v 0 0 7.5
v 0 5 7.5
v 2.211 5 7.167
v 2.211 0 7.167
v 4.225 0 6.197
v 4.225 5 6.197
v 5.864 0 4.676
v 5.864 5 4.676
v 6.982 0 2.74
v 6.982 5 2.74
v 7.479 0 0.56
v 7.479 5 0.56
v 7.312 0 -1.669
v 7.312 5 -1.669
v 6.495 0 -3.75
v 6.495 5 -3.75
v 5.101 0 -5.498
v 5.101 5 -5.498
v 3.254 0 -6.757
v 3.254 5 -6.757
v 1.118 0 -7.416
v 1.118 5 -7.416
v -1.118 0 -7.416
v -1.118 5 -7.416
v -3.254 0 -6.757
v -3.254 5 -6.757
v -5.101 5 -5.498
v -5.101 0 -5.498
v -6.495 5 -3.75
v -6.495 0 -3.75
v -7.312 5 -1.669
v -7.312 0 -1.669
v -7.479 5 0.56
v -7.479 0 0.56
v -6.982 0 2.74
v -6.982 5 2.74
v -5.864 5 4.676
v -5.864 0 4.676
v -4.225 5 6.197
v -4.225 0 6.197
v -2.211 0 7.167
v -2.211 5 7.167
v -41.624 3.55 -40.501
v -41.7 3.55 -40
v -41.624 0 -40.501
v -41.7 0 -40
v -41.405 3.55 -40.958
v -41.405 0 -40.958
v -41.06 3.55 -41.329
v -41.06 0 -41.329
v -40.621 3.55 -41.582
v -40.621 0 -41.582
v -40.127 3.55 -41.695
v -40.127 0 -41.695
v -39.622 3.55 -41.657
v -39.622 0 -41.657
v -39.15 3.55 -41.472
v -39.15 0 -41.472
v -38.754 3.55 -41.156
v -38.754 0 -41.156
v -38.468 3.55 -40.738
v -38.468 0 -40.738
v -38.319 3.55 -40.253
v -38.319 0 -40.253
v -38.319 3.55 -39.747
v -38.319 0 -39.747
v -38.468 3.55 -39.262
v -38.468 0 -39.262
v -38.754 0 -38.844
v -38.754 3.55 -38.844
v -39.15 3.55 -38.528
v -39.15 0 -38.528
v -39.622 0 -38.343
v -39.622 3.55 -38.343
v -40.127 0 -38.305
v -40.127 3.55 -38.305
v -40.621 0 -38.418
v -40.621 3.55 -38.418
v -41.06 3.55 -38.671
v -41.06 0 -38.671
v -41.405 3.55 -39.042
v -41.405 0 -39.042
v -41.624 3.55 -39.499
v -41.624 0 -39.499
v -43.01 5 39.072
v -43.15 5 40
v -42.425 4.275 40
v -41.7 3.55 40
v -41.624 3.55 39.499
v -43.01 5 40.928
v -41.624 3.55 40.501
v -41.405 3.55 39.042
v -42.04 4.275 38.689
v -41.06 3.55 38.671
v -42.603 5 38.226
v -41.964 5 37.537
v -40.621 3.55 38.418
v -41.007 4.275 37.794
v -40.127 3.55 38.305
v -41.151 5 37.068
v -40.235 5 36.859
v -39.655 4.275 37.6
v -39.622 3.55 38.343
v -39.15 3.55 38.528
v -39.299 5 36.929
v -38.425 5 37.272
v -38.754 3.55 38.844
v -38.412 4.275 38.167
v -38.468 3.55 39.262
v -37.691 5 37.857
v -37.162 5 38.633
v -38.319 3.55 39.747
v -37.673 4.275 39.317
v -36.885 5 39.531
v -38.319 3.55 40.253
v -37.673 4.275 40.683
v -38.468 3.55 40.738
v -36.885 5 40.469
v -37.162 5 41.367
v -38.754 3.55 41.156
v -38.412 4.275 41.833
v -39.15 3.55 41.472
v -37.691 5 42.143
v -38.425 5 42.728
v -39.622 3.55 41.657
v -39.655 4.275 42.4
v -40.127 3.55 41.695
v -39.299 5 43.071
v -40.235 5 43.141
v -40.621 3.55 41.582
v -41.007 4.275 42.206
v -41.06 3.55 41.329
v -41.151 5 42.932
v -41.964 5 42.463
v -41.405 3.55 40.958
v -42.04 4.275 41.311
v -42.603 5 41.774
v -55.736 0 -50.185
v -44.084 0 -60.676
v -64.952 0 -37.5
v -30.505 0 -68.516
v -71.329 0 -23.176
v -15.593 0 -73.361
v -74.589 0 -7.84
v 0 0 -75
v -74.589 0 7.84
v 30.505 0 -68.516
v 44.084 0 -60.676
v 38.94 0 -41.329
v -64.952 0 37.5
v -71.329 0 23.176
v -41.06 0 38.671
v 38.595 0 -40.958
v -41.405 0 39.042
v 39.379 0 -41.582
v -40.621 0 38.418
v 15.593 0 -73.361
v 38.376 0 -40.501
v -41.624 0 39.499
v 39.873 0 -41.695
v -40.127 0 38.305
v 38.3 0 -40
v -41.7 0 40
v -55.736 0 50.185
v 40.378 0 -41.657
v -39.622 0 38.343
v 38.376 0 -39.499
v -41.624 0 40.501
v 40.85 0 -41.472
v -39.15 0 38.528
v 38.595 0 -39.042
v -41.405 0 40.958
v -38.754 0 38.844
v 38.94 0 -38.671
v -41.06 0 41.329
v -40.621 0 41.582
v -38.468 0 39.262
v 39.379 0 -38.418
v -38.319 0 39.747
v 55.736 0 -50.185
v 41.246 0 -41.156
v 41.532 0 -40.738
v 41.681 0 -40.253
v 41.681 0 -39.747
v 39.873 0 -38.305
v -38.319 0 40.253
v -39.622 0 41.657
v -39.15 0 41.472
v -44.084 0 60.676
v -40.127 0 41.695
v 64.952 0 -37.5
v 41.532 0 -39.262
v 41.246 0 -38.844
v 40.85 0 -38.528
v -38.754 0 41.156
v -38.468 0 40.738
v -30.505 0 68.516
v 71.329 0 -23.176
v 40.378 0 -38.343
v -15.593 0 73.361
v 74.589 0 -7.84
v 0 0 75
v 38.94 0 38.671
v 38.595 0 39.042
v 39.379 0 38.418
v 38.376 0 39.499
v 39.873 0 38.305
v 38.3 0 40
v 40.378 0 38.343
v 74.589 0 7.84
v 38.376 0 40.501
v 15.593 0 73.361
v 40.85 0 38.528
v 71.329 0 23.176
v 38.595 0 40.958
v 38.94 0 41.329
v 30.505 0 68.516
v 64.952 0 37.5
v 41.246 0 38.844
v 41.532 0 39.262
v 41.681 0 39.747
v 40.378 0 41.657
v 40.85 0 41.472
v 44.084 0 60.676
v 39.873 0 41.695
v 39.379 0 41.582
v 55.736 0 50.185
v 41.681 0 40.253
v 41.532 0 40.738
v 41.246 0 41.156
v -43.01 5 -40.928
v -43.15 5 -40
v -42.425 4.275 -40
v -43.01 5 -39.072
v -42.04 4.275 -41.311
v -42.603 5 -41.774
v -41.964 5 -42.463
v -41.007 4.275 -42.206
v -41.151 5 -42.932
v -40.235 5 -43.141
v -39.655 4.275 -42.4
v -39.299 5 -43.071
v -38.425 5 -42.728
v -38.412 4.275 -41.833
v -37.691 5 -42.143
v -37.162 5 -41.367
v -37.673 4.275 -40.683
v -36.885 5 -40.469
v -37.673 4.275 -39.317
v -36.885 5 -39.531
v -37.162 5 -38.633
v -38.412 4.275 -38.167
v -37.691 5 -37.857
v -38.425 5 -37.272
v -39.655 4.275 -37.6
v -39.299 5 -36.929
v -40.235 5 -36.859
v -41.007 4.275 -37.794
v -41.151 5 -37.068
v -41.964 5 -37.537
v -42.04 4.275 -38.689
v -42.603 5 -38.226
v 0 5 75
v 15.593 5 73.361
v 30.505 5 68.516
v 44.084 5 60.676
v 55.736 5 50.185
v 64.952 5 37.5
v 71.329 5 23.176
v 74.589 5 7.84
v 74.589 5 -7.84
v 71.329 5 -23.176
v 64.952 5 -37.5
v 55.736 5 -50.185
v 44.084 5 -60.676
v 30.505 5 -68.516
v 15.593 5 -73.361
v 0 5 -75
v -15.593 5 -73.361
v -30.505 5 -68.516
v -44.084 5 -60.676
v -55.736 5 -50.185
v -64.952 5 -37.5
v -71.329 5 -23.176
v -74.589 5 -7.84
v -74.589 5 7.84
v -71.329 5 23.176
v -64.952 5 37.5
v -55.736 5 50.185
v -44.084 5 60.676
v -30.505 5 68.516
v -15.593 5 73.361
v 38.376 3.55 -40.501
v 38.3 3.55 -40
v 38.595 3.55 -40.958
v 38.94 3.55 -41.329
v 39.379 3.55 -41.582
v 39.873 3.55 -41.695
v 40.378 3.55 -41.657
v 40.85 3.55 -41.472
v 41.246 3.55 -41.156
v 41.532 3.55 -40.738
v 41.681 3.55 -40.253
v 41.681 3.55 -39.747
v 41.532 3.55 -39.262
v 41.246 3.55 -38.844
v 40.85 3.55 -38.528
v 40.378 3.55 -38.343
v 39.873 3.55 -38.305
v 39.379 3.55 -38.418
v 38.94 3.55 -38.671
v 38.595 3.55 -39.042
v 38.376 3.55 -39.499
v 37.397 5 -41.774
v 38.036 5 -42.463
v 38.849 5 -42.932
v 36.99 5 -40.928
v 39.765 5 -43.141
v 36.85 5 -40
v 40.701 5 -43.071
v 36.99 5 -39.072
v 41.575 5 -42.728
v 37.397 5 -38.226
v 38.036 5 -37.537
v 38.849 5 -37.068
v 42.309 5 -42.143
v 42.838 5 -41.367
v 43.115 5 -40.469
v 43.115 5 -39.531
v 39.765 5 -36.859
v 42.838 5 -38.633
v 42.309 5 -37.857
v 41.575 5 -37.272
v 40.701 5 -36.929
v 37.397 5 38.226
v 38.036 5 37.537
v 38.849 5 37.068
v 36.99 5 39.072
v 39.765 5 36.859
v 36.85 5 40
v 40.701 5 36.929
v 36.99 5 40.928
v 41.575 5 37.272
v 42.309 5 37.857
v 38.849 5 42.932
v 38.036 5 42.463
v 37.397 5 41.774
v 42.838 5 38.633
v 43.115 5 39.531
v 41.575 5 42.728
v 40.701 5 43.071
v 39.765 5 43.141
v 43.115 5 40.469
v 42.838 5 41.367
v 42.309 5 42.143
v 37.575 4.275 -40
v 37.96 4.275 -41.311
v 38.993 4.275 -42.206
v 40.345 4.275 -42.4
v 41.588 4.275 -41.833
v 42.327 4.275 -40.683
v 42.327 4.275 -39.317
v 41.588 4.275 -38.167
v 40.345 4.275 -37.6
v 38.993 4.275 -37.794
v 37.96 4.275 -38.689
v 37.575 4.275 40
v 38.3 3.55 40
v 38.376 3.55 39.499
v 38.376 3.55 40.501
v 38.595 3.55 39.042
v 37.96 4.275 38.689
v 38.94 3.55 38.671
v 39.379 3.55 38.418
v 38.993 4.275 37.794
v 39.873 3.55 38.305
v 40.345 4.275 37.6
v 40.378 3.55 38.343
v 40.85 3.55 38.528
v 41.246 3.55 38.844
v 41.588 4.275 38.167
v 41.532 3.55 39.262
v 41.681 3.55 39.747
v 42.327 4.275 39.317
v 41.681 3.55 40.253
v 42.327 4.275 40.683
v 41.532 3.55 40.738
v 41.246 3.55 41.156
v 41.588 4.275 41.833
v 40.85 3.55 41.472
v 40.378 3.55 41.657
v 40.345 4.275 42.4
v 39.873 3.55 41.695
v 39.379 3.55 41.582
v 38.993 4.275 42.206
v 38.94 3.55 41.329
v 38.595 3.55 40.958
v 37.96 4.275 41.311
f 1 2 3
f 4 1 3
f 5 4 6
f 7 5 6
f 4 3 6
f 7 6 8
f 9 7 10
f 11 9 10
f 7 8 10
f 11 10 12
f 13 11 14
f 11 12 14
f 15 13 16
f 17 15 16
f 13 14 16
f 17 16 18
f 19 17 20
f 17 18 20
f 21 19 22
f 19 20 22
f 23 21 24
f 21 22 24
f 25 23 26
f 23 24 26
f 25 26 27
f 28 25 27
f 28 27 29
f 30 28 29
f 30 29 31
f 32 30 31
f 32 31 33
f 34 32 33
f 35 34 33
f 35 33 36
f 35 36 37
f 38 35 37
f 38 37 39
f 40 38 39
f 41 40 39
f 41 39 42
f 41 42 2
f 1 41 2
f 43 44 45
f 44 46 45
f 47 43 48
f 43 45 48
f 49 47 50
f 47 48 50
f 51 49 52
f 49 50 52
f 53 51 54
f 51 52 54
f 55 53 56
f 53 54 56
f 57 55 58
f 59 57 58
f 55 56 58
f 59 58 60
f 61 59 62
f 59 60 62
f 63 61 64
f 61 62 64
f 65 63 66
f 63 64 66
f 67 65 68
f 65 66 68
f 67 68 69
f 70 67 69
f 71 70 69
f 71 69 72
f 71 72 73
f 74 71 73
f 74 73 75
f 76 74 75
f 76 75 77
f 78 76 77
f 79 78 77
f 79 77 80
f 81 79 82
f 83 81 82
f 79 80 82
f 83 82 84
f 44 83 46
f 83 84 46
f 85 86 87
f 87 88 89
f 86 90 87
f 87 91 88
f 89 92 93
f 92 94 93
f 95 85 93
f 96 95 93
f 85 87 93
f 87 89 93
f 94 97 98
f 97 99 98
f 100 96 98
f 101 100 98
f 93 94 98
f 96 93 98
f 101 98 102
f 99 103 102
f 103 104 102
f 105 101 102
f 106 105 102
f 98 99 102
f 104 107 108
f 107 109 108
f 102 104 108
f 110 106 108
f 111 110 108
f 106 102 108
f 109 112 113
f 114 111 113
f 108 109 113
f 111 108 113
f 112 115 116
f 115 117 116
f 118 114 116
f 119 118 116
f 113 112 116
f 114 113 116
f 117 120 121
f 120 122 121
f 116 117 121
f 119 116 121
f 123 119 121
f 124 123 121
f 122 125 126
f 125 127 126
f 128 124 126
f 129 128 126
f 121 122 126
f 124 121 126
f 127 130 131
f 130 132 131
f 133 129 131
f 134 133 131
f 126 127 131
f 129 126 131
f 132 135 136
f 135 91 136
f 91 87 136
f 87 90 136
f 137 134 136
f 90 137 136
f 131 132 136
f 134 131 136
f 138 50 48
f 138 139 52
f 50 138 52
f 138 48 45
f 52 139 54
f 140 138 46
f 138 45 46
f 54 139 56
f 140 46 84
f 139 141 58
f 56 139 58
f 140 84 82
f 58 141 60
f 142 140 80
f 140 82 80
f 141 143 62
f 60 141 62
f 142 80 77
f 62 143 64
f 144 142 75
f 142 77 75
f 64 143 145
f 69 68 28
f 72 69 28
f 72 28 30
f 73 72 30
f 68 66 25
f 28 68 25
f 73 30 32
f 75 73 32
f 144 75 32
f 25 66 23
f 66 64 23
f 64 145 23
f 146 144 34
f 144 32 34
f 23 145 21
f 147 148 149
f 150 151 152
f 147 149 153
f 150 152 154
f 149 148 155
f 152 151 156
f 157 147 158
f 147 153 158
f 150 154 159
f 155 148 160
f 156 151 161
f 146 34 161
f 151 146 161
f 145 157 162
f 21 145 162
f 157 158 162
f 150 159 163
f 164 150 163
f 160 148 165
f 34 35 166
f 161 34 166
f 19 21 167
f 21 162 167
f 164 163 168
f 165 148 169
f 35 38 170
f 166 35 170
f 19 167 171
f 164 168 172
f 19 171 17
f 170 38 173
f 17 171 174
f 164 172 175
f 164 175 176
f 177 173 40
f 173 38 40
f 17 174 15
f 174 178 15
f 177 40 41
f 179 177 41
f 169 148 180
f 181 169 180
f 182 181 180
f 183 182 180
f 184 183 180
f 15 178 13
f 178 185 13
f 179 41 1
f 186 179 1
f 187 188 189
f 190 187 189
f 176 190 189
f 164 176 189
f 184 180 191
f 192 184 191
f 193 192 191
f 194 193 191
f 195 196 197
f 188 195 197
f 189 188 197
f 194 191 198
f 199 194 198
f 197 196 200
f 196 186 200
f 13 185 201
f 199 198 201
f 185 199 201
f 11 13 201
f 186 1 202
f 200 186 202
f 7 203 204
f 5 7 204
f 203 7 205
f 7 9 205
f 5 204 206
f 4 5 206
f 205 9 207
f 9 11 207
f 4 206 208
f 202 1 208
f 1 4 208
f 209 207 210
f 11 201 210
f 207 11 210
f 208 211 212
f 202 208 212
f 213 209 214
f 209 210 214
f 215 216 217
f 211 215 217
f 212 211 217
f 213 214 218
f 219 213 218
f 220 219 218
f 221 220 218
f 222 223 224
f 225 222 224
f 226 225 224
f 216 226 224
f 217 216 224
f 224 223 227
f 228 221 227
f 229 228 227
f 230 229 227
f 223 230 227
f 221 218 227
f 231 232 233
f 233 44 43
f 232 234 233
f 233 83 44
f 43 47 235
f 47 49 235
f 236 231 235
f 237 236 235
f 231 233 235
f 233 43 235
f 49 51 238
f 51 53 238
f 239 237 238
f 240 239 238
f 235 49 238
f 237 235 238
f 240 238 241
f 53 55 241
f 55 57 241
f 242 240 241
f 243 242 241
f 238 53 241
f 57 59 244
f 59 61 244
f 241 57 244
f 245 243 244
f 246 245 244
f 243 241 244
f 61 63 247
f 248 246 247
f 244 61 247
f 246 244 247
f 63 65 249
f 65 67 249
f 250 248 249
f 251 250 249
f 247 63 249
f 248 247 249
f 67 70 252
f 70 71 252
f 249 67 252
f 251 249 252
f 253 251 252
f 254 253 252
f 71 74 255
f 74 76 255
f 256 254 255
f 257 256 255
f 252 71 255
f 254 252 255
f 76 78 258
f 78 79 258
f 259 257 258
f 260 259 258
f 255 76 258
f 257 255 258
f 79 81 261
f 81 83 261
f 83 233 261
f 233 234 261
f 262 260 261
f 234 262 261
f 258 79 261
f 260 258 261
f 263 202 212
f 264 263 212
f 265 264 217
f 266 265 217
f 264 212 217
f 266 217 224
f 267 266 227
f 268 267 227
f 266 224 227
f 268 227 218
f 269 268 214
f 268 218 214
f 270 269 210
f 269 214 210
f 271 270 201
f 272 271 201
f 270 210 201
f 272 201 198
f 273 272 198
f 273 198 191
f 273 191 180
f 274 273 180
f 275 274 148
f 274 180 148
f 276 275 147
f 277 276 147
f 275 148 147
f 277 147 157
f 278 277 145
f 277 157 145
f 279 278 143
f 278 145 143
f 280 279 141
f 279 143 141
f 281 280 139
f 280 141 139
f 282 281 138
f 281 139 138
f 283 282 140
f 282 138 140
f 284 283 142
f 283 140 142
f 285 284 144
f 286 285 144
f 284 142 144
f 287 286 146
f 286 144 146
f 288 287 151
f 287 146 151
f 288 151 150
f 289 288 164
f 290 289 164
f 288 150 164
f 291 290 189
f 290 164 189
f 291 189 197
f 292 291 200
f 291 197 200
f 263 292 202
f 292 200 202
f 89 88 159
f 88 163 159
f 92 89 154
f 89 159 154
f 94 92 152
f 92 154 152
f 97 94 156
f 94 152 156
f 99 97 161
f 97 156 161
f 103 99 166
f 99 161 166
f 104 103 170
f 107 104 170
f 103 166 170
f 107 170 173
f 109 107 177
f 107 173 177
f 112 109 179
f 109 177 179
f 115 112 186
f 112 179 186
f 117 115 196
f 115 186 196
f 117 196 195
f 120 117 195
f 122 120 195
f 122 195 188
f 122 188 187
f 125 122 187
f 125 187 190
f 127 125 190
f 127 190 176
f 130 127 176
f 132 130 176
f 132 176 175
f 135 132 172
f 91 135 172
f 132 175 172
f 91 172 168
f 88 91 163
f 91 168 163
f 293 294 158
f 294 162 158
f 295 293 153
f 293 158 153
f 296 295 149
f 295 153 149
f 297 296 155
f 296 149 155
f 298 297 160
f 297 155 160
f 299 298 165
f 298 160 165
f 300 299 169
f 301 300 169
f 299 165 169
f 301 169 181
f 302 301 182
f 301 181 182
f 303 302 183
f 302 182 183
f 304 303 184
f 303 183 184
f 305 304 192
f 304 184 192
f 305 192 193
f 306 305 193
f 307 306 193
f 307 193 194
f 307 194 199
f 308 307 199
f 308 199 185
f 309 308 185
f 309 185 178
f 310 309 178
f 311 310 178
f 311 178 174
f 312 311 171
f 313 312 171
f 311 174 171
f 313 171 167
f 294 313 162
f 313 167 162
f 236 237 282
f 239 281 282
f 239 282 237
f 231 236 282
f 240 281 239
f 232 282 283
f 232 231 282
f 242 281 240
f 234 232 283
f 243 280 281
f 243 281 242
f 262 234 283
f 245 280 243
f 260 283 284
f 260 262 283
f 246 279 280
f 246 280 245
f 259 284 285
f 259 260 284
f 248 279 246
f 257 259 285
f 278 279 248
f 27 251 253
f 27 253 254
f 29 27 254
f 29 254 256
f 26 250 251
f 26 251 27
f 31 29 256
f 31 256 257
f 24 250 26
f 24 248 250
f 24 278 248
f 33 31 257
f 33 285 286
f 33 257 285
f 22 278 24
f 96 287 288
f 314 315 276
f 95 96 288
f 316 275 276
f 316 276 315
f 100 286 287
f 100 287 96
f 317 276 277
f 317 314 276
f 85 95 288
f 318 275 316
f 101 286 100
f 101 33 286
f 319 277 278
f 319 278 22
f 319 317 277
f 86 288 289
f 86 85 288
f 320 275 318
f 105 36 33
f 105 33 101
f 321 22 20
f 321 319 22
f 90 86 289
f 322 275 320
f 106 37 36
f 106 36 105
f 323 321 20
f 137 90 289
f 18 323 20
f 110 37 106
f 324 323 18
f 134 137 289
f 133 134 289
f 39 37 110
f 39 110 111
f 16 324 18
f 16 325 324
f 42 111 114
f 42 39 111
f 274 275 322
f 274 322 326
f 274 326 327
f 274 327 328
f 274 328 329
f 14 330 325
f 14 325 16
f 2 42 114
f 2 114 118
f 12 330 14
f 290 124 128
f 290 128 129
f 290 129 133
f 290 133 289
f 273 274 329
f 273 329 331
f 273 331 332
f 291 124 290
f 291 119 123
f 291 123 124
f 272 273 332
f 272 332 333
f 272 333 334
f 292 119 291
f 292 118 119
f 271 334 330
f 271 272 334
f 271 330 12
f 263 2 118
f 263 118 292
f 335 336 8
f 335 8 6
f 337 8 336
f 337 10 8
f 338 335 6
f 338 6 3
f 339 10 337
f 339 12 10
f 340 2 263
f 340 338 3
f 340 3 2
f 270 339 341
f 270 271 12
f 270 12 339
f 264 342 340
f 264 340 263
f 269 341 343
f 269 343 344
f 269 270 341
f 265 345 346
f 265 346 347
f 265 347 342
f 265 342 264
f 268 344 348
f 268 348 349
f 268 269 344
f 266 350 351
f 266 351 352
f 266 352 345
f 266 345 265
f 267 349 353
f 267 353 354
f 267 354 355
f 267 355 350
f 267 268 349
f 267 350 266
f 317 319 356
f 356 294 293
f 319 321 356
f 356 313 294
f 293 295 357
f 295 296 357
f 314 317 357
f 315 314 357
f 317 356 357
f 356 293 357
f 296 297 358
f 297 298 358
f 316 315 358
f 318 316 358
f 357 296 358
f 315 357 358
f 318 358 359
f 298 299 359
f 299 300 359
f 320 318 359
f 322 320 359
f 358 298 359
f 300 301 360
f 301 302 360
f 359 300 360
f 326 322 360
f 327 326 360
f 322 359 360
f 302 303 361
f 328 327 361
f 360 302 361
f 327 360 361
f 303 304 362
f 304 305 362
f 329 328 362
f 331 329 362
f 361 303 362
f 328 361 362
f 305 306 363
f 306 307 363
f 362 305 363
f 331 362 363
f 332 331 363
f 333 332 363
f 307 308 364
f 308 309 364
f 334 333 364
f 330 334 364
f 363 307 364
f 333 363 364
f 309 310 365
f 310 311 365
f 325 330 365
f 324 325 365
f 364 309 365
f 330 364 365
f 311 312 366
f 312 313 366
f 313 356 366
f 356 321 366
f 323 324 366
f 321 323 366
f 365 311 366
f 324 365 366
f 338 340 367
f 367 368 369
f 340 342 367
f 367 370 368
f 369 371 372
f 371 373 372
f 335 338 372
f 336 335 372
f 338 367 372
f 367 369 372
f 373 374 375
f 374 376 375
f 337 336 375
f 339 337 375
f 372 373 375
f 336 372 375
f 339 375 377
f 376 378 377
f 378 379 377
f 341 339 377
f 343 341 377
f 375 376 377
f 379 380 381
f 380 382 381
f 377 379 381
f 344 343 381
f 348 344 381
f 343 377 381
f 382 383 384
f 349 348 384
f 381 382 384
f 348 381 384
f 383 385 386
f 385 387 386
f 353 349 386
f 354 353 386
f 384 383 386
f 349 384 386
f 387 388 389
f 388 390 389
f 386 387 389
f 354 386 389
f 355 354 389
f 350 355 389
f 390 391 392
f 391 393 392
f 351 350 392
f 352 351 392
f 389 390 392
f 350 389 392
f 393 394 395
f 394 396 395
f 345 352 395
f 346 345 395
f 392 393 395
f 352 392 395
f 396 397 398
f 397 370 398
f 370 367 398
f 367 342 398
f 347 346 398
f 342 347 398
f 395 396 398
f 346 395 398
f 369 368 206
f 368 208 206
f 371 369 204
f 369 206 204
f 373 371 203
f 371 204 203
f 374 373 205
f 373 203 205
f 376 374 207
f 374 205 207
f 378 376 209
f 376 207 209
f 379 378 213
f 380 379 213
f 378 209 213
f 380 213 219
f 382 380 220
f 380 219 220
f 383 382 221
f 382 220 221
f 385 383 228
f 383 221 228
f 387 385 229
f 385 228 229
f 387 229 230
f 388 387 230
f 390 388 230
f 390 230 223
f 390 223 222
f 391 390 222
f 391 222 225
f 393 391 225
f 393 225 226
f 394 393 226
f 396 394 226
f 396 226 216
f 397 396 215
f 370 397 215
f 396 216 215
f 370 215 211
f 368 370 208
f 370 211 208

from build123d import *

# Parameters (mm, degrees)
SKETCH1_R                                           = 75
BOSS_EXTRUDE1_DEPTH                                 = 5
CSK_FOR_M3_COUNTERSUNK_FLAT_HEAD_SCREW1_D           = 3.4
CSK_FOR_M3_COUNTERSUNK_FLAT_HEAD_SCREW1_CSINK_D     = 6.3
CSK_FOR_M3_COUNTERSUNK_FLAT_HEAD_SCREW1_CSINK_ANGLE = 90
SKETCH5_R                                           = 7.5
CUT_EXTRUDE1_DEPTH                                  = 107.183802908


with BuildPart() as part:
    # Sketch1 → Boss-Extrude1 (new body)
    with BuildSketch(Plane(origin=(0, 0, 0), x_dir=(1, 0, 0), z_dir=(0, 1, 0))):
        with Locations(Location((0, 0, 0), (0, 0, 270))):
            Circle(SKETCH1_R)
    extrude(amount=BOSS_EXTRUDE1_DEPTH)

    # CSK for M3 Countersunk Flat Head Screw1 (through all)
    with Locations(Plane(origin=(0, 5, 0), x_dir=(1, 0, 0), z_dir=(0, 1, 0))):
        with Locations((-40, 40), (40, 40), (40, -40), (-40, -40)):
            CounterSinkHole(CSK_FOR_M3_COUNTERSUNK_FLAT_HEAD_SCREW1_D / 2, CSK_FOR_M3_COUNTERSUNK_FLAT_HEAD_SCREW1_CSINK_D / 2, counter_sink_angle=CSK_FOR_M3_COUNTERSUNK_FLAT_HEAD_SCREW1_CSINK_ANGLE)

    # Sketch5 → Cut-Extrude1 (cut, through all)
    with BuildSketch(Plane(origin=(0, 5, 0), x_dir=(1, 0, 0), z_dir=(0, 1, 0))):
        with Locations(Location((0, 0, 0), (0, 0, 270))):
            Circle(SKETCH5_R)
    extrude(amount=-CUT_EXTRUDE1_DEPTH, mode=Mode.SUBTRACT)


solid = part.part
